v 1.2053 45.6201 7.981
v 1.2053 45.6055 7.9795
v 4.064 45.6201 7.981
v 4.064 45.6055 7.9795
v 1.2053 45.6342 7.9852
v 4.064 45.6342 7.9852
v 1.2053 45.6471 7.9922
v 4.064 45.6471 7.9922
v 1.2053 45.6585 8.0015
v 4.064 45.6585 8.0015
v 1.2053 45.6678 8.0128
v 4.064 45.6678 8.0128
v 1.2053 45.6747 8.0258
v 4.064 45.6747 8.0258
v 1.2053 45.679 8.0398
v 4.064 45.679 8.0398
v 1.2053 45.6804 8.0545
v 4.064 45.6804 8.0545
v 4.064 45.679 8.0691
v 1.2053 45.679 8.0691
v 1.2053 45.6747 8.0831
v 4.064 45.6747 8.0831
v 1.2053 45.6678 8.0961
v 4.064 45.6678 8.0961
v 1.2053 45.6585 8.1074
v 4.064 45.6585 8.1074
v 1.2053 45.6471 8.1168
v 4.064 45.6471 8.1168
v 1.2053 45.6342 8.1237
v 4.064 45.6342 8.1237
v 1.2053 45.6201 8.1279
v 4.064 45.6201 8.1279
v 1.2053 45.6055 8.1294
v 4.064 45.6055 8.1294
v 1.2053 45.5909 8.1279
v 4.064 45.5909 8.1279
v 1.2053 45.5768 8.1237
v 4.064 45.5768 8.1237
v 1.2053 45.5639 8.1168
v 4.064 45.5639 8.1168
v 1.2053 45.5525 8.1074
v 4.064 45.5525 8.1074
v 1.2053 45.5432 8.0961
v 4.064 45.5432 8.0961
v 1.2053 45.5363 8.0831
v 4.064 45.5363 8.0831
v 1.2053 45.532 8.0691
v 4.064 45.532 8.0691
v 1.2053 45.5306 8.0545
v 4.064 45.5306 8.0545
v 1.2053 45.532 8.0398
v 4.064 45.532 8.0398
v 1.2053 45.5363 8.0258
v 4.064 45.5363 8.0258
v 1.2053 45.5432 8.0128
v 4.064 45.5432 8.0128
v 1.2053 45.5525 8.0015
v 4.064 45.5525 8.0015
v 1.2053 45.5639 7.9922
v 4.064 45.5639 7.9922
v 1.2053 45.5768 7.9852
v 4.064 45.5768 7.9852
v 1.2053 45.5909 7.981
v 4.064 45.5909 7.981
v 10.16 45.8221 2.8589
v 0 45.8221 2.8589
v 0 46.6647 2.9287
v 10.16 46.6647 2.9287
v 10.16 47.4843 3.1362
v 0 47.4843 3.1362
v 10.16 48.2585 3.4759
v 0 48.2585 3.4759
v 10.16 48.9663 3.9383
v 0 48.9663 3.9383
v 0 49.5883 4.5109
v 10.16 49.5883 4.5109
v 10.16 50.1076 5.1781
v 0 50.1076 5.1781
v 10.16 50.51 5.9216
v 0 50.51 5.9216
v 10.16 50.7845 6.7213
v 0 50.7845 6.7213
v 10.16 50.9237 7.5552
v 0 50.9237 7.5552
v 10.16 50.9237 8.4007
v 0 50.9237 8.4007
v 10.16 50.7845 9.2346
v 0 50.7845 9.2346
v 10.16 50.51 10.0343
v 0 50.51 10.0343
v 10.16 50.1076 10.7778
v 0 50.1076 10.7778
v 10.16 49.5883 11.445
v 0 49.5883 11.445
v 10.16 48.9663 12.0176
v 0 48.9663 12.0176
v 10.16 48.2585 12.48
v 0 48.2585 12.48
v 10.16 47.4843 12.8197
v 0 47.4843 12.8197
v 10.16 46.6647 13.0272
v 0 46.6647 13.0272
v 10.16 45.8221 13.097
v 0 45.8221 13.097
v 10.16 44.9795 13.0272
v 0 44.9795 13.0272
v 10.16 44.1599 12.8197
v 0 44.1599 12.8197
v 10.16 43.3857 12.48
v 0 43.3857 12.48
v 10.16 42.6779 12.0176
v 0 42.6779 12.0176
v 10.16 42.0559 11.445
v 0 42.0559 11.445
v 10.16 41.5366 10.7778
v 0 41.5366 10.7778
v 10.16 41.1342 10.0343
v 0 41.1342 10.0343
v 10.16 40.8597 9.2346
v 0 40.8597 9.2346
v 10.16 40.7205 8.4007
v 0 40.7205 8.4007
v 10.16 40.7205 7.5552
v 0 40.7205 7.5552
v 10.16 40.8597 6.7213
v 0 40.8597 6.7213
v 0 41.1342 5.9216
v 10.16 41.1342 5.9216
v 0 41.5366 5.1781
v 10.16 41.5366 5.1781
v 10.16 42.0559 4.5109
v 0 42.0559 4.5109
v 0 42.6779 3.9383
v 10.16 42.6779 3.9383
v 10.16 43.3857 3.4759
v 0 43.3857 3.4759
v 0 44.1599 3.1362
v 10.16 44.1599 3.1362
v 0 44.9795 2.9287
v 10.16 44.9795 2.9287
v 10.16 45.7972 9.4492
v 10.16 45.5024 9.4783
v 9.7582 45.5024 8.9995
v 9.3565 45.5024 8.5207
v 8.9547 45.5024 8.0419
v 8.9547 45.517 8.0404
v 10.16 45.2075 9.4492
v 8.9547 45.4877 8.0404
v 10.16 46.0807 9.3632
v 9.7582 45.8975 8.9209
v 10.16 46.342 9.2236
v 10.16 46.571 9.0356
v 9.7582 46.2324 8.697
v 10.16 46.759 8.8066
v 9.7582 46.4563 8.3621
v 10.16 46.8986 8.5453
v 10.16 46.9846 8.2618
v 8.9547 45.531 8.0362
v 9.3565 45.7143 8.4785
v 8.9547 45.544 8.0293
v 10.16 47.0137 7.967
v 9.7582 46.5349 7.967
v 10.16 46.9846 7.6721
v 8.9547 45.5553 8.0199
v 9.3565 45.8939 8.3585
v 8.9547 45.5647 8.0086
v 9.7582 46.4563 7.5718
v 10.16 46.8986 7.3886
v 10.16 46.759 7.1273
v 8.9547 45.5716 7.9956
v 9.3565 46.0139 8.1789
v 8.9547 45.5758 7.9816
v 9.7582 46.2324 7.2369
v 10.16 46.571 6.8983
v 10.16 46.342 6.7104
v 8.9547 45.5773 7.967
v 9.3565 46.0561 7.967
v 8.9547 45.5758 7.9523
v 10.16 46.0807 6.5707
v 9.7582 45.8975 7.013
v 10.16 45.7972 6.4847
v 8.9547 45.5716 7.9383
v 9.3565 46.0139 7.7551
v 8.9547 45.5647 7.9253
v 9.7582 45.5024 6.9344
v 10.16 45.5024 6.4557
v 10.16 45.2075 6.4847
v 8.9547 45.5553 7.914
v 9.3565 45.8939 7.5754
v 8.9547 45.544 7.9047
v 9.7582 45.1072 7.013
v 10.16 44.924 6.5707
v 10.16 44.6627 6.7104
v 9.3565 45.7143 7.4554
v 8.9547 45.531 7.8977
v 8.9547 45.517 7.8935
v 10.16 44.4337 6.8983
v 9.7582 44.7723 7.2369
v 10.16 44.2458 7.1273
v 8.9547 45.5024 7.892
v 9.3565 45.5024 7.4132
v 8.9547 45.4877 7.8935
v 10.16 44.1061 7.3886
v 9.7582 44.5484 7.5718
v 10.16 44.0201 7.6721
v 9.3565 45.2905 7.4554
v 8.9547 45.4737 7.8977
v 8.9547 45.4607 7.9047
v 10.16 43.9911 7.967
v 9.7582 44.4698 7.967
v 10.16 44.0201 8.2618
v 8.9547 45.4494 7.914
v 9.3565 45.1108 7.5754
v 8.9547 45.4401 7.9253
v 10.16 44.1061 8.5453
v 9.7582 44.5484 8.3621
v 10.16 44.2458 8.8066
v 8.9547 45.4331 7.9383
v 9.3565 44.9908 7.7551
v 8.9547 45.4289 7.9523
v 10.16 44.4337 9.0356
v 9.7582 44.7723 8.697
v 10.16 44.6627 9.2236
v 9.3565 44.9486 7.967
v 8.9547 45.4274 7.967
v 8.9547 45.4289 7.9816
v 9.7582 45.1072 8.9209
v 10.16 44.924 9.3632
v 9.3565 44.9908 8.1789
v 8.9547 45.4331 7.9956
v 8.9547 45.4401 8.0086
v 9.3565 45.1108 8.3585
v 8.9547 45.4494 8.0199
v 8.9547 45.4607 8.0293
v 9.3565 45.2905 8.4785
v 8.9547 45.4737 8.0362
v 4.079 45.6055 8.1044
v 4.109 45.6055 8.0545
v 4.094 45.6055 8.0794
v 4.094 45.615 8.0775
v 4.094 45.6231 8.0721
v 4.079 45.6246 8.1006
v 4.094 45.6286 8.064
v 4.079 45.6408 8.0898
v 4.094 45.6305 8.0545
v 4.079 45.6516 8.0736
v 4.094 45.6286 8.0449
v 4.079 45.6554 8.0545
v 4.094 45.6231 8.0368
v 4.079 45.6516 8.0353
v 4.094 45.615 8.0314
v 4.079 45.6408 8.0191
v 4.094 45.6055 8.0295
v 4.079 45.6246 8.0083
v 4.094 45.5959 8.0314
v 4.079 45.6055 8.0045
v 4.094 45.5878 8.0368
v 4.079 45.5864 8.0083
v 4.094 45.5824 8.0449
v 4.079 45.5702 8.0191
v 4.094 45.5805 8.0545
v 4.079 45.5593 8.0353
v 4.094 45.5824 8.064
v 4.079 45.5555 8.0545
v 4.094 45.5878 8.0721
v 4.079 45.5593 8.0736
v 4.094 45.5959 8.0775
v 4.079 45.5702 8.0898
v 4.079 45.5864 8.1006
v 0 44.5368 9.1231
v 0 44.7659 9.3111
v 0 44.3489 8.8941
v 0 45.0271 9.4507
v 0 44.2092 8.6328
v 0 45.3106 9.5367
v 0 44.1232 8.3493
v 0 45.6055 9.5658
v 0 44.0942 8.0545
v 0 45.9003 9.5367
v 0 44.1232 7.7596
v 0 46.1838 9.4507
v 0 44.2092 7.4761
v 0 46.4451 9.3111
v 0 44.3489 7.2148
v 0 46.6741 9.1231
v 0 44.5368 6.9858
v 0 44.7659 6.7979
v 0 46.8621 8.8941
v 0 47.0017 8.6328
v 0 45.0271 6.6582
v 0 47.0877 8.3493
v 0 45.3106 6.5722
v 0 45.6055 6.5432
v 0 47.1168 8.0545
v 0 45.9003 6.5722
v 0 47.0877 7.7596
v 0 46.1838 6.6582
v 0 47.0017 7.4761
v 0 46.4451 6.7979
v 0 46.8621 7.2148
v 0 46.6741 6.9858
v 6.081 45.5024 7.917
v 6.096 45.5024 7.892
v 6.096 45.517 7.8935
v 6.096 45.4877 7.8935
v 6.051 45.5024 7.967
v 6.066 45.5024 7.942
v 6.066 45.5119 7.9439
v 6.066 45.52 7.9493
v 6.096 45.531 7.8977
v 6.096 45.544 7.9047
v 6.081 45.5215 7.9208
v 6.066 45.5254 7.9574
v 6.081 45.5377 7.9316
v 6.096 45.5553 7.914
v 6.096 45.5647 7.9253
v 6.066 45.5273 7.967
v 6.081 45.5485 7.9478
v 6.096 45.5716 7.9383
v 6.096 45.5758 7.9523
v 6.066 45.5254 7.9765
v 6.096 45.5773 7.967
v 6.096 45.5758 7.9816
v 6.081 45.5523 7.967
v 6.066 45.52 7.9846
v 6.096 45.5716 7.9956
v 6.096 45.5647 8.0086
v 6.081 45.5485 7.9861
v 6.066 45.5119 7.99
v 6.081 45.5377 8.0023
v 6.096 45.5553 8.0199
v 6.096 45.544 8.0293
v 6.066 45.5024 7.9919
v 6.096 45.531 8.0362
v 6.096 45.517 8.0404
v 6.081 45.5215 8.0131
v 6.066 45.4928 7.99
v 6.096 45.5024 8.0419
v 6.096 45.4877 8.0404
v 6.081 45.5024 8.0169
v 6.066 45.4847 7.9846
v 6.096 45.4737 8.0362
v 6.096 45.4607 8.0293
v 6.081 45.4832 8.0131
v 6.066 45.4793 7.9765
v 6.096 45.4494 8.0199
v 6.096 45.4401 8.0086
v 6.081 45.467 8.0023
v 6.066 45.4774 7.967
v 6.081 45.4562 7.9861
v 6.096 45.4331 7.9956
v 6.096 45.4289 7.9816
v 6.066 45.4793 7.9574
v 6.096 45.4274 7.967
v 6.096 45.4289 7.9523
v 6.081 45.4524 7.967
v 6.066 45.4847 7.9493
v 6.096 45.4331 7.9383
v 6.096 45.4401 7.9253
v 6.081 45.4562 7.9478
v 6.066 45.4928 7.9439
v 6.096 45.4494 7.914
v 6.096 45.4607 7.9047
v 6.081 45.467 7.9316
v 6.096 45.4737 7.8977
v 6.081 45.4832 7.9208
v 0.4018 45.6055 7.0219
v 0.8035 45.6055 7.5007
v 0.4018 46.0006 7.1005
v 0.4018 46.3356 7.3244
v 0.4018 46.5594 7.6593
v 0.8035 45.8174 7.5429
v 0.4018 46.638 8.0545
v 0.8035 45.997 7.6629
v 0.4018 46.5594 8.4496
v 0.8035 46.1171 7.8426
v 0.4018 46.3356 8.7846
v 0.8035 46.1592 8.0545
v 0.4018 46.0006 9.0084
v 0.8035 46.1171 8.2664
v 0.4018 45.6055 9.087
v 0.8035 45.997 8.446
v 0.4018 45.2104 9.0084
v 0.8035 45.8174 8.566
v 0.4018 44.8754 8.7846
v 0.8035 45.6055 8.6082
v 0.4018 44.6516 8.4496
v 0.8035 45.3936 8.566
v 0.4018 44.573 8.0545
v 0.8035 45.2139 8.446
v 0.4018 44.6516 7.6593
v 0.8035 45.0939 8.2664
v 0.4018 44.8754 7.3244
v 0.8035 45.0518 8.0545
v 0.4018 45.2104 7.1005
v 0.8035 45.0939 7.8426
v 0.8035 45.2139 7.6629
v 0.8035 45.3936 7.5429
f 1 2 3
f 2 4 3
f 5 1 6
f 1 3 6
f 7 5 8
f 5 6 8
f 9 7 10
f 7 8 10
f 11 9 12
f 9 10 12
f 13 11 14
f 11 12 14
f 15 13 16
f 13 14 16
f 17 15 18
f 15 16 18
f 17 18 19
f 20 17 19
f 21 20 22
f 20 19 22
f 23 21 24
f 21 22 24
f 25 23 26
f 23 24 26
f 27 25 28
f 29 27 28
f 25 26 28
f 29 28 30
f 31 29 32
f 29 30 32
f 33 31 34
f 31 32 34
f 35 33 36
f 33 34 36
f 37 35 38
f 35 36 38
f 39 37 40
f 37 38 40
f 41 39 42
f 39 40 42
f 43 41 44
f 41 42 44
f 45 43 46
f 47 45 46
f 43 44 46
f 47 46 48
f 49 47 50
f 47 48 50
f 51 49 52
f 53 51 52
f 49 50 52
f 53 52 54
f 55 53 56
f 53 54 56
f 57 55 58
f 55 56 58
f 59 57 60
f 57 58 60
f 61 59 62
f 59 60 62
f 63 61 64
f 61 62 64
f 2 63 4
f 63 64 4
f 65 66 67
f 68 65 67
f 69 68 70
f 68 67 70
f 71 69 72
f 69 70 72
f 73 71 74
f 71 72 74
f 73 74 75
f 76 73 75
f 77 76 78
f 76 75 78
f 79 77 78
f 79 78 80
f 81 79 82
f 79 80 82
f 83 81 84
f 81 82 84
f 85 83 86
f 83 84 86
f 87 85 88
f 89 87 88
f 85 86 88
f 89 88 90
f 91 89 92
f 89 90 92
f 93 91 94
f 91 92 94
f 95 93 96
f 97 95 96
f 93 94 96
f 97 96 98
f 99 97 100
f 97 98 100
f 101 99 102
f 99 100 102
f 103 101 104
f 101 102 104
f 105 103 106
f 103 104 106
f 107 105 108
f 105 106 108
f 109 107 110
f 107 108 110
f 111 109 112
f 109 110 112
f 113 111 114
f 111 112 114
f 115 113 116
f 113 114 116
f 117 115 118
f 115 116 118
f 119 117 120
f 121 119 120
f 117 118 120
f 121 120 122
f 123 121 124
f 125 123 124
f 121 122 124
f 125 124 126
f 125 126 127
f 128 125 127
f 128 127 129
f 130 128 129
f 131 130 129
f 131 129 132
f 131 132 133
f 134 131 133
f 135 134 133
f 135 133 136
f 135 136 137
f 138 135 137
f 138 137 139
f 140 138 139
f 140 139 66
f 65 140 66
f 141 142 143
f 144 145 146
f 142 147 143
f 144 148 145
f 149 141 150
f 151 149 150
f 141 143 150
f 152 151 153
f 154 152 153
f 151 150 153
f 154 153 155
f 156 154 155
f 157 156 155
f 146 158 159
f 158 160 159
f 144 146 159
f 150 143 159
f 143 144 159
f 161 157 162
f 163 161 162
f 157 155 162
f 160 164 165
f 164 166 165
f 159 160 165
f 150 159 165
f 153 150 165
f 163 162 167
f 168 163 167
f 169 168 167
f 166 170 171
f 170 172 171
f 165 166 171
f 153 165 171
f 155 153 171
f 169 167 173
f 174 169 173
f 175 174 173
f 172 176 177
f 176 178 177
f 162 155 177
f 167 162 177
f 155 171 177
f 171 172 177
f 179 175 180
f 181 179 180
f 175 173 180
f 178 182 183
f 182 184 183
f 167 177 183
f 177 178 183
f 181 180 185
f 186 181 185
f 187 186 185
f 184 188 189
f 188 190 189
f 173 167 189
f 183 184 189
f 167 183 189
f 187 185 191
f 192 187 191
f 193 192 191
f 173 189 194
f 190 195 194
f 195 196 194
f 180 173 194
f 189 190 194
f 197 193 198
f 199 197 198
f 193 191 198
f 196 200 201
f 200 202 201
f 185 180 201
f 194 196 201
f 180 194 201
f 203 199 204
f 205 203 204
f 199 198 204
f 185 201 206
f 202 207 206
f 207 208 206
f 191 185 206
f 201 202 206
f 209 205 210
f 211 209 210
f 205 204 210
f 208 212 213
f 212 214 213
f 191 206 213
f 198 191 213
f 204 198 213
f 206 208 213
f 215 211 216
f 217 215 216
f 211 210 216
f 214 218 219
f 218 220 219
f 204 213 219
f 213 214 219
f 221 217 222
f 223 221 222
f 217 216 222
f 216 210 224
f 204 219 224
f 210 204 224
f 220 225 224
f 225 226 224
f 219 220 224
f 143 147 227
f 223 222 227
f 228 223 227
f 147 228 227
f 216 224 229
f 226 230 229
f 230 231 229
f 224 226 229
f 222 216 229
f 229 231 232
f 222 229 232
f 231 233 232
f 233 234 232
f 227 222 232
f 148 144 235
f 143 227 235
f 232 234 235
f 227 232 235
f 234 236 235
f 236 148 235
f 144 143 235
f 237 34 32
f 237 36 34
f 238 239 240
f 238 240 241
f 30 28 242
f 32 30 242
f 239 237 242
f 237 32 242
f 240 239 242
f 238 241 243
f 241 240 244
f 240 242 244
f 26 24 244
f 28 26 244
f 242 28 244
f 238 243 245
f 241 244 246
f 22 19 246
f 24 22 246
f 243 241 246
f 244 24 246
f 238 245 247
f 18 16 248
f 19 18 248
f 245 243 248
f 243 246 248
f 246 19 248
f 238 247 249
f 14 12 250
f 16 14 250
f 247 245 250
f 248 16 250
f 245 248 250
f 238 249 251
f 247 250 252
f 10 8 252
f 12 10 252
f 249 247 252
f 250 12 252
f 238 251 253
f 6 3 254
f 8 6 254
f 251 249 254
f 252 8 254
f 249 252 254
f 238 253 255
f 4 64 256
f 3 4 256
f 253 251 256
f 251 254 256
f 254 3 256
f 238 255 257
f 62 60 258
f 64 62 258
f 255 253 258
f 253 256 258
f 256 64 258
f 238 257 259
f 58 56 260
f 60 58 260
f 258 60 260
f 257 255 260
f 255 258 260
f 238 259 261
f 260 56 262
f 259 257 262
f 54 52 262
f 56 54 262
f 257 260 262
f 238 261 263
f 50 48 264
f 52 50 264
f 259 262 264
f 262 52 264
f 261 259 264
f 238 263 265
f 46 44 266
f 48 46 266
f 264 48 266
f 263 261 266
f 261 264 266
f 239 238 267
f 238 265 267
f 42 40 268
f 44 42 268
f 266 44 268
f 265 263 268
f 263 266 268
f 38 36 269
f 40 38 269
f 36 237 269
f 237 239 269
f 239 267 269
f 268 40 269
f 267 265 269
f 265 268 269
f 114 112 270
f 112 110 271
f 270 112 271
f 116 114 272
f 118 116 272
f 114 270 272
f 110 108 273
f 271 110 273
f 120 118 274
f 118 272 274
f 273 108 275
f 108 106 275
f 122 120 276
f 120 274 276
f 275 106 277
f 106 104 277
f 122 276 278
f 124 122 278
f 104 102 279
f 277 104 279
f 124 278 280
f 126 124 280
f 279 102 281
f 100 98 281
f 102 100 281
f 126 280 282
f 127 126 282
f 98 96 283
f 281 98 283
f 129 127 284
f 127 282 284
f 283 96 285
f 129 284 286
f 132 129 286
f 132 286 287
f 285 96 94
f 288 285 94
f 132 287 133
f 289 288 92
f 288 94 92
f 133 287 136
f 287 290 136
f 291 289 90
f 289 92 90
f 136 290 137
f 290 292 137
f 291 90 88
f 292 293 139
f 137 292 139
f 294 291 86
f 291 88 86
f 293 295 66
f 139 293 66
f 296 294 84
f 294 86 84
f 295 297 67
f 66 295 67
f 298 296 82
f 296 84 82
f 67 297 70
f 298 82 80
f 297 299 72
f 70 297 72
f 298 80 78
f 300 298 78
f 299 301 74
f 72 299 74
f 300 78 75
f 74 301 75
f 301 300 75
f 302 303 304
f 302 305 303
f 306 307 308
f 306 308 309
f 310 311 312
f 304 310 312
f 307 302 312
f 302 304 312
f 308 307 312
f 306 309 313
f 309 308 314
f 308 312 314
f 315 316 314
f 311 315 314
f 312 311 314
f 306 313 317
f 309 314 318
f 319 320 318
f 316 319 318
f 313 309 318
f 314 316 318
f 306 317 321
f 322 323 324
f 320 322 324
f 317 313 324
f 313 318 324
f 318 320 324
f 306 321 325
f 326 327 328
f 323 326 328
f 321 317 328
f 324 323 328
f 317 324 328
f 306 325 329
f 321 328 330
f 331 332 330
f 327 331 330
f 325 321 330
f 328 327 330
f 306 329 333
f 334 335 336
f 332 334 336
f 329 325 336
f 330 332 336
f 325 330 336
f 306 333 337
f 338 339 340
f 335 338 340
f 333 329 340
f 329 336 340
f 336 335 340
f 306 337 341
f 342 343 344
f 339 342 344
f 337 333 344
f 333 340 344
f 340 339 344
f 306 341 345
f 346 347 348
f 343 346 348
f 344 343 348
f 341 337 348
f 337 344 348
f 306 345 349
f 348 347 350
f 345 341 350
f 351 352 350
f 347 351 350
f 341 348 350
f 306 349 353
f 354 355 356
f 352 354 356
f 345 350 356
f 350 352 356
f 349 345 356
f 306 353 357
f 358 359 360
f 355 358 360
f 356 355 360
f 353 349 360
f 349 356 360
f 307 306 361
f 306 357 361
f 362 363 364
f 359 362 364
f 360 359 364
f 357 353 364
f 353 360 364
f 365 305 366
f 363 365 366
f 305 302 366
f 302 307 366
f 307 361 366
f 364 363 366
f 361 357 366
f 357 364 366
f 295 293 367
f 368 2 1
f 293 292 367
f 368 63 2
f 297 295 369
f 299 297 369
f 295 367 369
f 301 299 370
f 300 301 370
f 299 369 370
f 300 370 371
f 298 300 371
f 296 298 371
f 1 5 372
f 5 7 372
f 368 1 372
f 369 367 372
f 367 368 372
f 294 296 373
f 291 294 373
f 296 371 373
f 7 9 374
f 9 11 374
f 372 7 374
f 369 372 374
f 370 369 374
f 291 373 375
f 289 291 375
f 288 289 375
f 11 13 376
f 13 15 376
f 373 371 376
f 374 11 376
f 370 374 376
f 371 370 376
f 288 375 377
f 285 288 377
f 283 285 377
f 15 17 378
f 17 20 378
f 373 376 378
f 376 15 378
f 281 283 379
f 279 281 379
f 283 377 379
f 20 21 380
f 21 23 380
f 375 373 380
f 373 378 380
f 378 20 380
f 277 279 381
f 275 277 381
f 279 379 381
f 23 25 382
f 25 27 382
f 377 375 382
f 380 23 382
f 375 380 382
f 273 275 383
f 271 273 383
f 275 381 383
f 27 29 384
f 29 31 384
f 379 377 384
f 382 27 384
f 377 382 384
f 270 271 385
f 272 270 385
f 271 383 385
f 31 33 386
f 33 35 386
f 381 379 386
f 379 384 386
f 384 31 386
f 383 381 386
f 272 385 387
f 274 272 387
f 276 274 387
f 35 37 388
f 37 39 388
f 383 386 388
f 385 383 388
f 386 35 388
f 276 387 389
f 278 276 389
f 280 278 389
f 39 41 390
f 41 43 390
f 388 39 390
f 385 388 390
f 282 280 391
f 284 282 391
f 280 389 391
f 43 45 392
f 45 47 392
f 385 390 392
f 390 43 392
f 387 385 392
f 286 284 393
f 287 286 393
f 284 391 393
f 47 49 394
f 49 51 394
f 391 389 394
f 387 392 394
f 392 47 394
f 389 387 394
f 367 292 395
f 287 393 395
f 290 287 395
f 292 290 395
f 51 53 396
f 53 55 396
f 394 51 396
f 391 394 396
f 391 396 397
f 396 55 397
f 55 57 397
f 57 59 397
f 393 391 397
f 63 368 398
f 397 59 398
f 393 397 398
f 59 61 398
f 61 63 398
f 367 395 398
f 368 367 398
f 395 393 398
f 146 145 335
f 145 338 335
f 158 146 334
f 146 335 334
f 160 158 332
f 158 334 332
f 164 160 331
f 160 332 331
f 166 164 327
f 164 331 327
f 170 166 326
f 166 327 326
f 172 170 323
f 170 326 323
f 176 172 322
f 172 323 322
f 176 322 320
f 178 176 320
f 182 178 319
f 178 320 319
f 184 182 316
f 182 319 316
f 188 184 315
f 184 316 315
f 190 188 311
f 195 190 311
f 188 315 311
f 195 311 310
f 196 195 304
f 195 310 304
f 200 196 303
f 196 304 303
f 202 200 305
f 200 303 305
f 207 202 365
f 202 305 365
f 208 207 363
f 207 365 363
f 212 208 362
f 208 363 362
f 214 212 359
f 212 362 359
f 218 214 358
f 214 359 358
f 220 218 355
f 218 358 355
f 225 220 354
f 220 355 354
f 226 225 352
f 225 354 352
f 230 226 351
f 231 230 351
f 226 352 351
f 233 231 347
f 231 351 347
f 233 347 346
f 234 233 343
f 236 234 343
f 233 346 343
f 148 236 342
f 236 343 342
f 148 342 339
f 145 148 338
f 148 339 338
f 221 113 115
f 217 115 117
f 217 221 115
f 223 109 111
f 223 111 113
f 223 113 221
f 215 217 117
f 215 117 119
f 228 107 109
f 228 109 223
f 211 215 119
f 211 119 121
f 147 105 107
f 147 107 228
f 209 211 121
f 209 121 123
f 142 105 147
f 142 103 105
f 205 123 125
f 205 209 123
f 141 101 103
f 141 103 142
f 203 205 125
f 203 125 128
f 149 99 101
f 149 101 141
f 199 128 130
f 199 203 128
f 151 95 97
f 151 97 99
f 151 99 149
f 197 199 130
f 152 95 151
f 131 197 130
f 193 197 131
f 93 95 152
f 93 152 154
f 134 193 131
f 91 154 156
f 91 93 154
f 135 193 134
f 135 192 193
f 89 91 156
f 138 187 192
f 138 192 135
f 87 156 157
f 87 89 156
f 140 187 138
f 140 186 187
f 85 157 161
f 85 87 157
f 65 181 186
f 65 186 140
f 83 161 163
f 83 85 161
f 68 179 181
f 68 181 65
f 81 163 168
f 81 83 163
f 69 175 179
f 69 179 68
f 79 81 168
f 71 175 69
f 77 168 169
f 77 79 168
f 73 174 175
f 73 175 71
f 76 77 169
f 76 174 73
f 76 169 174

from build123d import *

# Parameters (mm, degrees)
SKETCH1_R                              = 5.119071812
BOSS_EXTRUDE1_DEPTH                    = 10.16
F_97_0_0059_DIAMETER_HOLE1_D           = 0.14986
F_97_0_0059_DIAMETER_HOLE1_DEPTH       = 4.064
F_97_0_0059_DIAMETER_HOLE1_CSINK_D     = 3.0226
F_97_0_0059_DIAMETER_HOLE1_CSINK_ANGLE = 100
F_97_0_0059_DIAMETER_HOLE1_TIP         = 0.045022486
F_97_0_0059_DIAMETER_HOLE2_D           = 0.14986
F_97_0_0059_DIAMETER_HOLE2_DEPTH       = 4.064
F_97_0_0059_DIAMETER_HOLE2_CSINK_D     = 3.0226
F_97_0_0059_DIAMETER_HOLE2_CSINK_ANGLE = 100
F_97_0_0059_DIAMETER_HOLE2_TIP         = 0.045022486


with BuildPart() as part:
    # Sketch1 → Boss-Extrude1 (new body)
    with BuildSketch(Plane(origin=(0, 0, 0), x_dir=(0, 0, -1), z_dir=(1, 0, 0))):
        with Locations((-7.977955169, 45.822101484)):
            Circle(SKETCH1_R)
    extrude(amount=BOSS_EXTRUDE1_DEPTH)

    # #97 (0.0059) Diameter Hole1
    with Locations(Plane(origin=(10.16, 0, 0), x_dir=(0, 0, -1), z_dir=(1, 0, 0))):
        with Locations((-7.966953198, 45.502352874), (-8.184469296, 76.052039223), (-8.264751999, 76.50814273)):
            CounterSinkHole(F_97_0_0059_DIAMETER_HOLE1_D / 2, F_97_0_0059_DIAMETER_HOLE1_CSINK_D / 2, depth=F_97_0_0059_DIAMETER_HOLE1_DEPTH, counter_sink_angle=F_97_0_0059_DIAMETER_HOLE1_CSINK_ANGLE)
            with Locations((0, 0, -(F_97_0_0059_DIAMETER_HOLE1_DEPTH + F_97_0_0059_DIAMETER_HOLE1_TIP / 2))):  # 118° drill point
                Cone(0, F_97_0_0059_DIAMETER_HOLE1_D / 2, F_97_0_0059_DIAMETER_HOLE1_TIP, mode=Mode.SUBTRACT)

    # #97 (0.0059) Diameter Hole2
    with Locations(Plane.ZY):
        with Locations((8.054455303, 45.605487912), (7.835684071, 14.98353801)):
            CounterSinkHole(F_97_0_0059_DIAMETER_HOLE2_D / 2, F_97_0_0059_DIAMETER_HOLE2_CSINK_D / 2, depth=F_97_0_0059_DIAMETER_HOLE2_DEPTH, counter_sink_angle=F_97_0_0059_DIAMETER_HOLE2_CSINK_ANGLE)
            with Locations((0, 0, -(F_97_0_0059_DIAMETER_HOLE2_DEPTH + F_97_0_0059_DIAMETER_HOLE2_TIP / 2))):  # 118° drill point
                Cone(0, F_97_0_0059_DIAMETER_HOLE2_D / 2, F_97_0_0059_DIAMETER_HOLE2_TIP, mode=Mode.SUBTRACT)


solid = part.part
